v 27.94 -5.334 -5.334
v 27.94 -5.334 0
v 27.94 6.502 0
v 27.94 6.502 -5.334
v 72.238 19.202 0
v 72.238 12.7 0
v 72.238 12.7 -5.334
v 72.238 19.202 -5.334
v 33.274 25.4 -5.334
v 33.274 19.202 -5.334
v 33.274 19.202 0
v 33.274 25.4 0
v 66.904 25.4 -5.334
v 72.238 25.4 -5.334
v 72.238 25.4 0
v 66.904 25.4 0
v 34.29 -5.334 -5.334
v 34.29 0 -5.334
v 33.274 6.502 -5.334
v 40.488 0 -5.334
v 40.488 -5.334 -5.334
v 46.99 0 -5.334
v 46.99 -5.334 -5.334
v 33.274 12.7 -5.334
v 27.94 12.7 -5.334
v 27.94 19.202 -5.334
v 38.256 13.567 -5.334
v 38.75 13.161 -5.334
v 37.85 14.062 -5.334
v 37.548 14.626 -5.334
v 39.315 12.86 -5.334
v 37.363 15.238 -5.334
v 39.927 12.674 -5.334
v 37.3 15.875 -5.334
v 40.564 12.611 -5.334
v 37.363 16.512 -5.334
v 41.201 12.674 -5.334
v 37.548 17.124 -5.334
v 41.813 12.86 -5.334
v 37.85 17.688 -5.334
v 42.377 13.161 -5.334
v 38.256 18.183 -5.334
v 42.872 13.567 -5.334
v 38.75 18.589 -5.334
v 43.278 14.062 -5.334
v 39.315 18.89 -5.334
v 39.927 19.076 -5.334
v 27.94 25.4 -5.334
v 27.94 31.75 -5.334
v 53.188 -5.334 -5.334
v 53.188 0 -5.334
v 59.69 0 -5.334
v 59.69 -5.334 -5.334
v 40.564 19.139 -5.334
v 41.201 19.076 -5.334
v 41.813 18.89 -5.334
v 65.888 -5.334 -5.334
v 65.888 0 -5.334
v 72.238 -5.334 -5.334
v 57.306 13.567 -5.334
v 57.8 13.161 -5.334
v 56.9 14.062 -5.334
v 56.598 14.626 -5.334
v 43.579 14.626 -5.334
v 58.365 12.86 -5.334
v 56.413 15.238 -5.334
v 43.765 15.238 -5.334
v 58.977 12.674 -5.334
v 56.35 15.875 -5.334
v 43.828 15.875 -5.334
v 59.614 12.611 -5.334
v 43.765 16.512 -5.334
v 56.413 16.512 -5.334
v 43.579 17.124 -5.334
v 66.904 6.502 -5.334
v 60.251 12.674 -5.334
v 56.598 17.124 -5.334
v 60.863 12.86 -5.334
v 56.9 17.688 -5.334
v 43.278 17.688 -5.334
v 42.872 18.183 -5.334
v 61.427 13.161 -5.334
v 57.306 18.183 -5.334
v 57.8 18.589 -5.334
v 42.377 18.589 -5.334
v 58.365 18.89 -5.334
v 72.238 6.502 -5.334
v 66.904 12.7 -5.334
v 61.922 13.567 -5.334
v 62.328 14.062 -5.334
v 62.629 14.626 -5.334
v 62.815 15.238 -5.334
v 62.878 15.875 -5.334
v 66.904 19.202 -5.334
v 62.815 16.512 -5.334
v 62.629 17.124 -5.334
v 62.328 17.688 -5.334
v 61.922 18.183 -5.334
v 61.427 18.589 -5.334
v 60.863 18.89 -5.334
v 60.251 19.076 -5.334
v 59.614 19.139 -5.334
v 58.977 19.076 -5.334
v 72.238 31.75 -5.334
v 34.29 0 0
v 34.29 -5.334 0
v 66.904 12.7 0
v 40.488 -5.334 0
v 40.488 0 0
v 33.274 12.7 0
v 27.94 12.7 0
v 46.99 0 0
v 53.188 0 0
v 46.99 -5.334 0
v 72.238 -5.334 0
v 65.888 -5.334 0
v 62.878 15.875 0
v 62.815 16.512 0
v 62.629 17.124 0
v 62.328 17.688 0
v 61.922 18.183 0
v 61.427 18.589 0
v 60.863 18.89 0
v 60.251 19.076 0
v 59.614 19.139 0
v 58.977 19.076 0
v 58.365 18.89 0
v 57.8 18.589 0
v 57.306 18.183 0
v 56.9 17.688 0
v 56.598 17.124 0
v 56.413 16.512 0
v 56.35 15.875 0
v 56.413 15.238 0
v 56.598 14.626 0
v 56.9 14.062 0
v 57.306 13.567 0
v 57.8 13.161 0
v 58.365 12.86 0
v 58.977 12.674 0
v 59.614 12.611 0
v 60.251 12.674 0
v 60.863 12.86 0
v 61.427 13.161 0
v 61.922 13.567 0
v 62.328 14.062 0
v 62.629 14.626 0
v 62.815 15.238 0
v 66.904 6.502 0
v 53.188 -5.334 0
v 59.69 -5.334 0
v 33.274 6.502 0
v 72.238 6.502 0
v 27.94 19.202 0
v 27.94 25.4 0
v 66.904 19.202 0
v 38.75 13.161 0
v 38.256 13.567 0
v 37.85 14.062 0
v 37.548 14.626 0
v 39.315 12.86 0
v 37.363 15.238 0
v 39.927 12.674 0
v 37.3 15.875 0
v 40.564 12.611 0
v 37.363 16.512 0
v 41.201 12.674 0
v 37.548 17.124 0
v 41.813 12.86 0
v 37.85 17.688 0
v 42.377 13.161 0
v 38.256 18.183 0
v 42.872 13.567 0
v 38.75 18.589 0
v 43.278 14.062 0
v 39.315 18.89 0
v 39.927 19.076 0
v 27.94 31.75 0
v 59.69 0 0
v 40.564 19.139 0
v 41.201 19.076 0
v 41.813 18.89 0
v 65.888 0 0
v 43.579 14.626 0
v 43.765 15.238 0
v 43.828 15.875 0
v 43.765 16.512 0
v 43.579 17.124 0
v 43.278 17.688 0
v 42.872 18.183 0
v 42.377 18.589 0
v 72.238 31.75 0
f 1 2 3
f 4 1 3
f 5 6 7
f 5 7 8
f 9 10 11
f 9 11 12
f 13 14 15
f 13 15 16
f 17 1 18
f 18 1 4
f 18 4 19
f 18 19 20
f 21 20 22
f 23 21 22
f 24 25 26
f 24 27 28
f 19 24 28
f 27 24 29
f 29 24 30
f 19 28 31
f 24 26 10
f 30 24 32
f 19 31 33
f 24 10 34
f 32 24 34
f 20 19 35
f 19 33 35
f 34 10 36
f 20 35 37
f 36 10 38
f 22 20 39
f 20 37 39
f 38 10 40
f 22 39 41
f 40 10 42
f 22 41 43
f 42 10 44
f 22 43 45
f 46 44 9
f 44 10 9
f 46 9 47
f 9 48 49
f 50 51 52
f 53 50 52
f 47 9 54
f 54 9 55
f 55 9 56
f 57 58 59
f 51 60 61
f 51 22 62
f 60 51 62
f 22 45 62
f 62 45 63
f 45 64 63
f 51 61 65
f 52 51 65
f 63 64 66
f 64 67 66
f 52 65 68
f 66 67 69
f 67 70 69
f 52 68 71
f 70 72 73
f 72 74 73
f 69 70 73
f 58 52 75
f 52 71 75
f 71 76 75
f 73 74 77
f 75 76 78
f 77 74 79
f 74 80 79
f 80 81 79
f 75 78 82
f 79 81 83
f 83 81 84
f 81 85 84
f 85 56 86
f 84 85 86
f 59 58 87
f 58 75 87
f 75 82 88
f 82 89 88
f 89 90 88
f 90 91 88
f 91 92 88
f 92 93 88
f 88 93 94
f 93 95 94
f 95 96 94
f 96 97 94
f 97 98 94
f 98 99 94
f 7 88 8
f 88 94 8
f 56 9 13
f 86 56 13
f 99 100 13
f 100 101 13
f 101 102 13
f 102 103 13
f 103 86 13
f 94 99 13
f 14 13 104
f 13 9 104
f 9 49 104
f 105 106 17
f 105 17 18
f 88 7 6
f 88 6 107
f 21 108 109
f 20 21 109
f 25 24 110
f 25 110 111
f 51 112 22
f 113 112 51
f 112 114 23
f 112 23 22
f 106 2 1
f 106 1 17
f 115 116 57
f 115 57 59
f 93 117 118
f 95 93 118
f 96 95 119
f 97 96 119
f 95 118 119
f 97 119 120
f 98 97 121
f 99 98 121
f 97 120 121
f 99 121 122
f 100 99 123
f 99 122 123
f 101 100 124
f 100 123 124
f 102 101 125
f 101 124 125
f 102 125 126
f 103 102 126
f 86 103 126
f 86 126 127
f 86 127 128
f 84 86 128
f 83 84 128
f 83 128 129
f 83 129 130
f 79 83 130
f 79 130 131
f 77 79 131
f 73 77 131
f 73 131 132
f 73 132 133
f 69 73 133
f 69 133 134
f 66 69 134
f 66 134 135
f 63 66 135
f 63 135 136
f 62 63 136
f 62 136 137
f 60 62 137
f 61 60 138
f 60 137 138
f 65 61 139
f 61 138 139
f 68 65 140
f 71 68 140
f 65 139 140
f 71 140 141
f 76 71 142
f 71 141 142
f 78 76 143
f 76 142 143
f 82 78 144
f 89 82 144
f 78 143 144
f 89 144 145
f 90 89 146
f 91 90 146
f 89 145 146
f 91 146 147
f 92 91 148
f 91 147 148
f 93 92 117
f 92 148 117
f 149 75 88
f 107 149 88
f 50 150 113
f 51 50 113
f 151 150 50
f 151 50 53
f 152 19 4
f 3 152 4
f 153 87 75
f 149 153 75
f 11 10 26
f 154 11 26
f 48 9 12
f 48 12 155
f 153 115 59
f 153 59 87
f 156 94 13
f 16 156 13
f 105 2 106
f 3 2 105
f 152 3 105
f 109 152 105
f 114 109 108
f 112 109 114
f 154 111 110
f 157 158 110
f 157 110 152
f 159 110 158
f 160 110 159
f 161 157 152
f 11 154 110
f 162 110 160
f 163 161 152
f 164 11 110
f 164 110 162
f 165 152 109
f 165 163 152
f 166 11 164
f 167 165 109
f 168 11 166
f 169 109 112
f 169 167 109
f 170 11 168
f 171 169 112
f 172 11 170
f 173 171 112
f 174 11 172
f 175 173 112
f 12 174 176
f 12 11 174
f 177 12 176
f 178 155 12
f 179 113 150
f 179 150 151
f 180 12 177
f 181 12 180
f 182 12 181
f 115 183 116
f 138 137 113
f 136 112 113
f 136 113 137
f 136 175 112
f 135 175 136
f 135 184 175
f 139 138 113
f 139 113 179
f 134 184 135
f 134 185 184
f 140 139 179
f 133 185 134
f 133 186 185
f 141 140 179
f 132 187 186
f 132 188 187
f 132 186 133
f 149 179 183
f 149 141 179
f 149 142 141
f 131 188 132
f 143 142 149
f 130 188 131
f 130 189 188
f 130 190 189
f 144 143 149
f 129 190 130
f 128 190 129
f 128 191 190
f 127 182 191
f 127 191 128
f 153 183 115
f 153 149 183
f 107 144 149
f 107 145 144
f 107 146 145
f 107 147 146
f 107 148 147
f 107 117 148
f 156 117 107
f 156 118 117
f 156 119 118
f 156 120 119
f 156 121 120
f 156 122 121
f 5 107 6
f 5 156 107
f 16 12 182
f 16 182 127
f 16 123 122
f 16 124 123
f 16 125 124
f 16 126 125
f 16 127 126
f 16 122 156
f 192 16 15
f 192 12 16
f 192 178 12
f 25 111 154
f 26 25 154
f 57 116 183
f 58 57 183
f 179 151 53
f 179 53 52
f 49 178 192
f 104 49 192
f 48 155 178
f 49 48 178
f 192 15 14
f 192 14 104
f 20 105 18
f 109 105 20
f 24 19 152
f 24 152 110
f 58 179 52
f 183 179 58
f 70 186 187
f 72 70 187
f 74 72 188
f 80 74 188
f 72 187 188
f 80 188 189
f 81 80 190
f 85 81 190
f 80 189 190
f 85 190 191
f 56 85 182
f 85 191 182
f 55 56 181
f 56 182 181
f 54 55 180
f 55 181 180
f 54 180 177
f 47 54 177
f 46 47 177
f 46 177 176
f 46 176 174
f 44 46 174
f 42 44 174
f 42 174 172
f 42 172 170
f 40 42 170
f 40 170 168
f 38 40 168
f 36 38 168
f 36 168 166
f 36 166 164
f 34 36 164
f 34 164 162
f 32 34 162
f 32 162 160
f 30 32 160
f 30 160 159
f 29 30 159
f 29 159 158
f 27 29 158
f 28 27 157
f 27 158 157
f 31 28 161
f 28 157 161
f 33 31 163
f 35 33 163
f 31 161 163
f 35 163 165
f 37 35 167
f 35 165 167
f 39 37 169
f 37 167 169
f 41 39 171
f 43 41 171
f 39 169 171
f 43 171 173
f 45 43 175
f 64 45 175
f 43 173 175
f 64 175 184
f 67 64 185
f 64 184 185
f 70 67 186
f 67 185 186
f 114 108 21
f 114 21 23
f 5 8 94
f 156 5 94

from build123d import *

# Parameters (mm, degrees)
SKETCH1_W                = 44.2976
SKETCH1_H                = 37.084
BOSS_EXTRUDE1_DEPTH      = 5.334
SKETCH2_W                = 6.1976
SKETCH2_H                = 5.334
CUT_EXTRUDE1_DEPTH       = 80.087198141
LPATTERN1_COUNT          = 3
LPATTERN1_PITCH          = 12.7
SKETCH3_W                = 5.334
SKETCH3_H                = 6.1976
CUT_EXTRUDE2_DEPTH       = 80.087198141
LPATTERN2_COUNT          = 2
LPATTERN2_PITCH          = 12.7
F_0_257_DIAMETER_HOLE1_D = 6.5278


with BuildPart() as part:
    # Sketch1 → Boss-Extrude1 (new body)
    with BuildSketch(Plane.XY):
        with Locations((50.0888, 13.208)):
            Rectangle(SKETCH1_W, SKETCH1_H)
    extrude(amount=-BOSS_EXTRUDE1_DEPTH)

    # Sketch2 → Cut-Extrude1 (cut, through all)
    with BuildSketch(Plane.XY):
        with Locations((62.7888, -2.667)):
            Rectangle(SKETCH2_W, SKETCH2_H)
    cut_extrude1 = extrude(amount=-CUT_EXTRUDE1_DEPTH, mode=Mode.SUBTRACT)

    # LPattern1: Cut-Extrude1 ×3
    with Locations(*[(-i * LPATTERN1_PITCH, 0, 0) for i in range(1, LPATTERN1_COUNT)]):
        add(cut_extrude1, mode=Mode.SUBTRACT)

    # Sketch3 → Cut-Extrude2 (cut, through all)
    with BuildSketch(Plane(origin=(0, 0, -5.334), x_dir=(-1, 0, 0), z_dir=(0, 0, -1))):
        with Locations((-69.5706, 9.6012)):
            Rectangle(SKETCH3_W, SKETCH3_H)
        with Locations((-30.607, 9.6012)):
            Rectangle(SKETCH3_W, SKETCH3_H)
    cut_extrude2 = extrude(amount=-CUT_EXTRUDE2_DEPTH, mode=Mode.SUBTRACT)

    # LPattern2: Cut-Extrude2 ×2
    with Locations(*[(0, i * LPATTERN2_PITCH, 0) for i in range(1, LPATTERN2_COUNT)]):
        add(cut_extrude2, mode=Mode.SUBTRACT)

    # F (0.257) Diameter Hole1 (through all)
    with Locations(Plane(origin=(0, 0, -5.334), x_dir=(-1, 0, 0), z_dir=(0, 0, -1))):
        with Locations((-59.6138, 15.875), (-40.5638, 15.875)):
            Hole(F_0_257_DIAMETER_HOLE1_D / 2)


solid = part.part
